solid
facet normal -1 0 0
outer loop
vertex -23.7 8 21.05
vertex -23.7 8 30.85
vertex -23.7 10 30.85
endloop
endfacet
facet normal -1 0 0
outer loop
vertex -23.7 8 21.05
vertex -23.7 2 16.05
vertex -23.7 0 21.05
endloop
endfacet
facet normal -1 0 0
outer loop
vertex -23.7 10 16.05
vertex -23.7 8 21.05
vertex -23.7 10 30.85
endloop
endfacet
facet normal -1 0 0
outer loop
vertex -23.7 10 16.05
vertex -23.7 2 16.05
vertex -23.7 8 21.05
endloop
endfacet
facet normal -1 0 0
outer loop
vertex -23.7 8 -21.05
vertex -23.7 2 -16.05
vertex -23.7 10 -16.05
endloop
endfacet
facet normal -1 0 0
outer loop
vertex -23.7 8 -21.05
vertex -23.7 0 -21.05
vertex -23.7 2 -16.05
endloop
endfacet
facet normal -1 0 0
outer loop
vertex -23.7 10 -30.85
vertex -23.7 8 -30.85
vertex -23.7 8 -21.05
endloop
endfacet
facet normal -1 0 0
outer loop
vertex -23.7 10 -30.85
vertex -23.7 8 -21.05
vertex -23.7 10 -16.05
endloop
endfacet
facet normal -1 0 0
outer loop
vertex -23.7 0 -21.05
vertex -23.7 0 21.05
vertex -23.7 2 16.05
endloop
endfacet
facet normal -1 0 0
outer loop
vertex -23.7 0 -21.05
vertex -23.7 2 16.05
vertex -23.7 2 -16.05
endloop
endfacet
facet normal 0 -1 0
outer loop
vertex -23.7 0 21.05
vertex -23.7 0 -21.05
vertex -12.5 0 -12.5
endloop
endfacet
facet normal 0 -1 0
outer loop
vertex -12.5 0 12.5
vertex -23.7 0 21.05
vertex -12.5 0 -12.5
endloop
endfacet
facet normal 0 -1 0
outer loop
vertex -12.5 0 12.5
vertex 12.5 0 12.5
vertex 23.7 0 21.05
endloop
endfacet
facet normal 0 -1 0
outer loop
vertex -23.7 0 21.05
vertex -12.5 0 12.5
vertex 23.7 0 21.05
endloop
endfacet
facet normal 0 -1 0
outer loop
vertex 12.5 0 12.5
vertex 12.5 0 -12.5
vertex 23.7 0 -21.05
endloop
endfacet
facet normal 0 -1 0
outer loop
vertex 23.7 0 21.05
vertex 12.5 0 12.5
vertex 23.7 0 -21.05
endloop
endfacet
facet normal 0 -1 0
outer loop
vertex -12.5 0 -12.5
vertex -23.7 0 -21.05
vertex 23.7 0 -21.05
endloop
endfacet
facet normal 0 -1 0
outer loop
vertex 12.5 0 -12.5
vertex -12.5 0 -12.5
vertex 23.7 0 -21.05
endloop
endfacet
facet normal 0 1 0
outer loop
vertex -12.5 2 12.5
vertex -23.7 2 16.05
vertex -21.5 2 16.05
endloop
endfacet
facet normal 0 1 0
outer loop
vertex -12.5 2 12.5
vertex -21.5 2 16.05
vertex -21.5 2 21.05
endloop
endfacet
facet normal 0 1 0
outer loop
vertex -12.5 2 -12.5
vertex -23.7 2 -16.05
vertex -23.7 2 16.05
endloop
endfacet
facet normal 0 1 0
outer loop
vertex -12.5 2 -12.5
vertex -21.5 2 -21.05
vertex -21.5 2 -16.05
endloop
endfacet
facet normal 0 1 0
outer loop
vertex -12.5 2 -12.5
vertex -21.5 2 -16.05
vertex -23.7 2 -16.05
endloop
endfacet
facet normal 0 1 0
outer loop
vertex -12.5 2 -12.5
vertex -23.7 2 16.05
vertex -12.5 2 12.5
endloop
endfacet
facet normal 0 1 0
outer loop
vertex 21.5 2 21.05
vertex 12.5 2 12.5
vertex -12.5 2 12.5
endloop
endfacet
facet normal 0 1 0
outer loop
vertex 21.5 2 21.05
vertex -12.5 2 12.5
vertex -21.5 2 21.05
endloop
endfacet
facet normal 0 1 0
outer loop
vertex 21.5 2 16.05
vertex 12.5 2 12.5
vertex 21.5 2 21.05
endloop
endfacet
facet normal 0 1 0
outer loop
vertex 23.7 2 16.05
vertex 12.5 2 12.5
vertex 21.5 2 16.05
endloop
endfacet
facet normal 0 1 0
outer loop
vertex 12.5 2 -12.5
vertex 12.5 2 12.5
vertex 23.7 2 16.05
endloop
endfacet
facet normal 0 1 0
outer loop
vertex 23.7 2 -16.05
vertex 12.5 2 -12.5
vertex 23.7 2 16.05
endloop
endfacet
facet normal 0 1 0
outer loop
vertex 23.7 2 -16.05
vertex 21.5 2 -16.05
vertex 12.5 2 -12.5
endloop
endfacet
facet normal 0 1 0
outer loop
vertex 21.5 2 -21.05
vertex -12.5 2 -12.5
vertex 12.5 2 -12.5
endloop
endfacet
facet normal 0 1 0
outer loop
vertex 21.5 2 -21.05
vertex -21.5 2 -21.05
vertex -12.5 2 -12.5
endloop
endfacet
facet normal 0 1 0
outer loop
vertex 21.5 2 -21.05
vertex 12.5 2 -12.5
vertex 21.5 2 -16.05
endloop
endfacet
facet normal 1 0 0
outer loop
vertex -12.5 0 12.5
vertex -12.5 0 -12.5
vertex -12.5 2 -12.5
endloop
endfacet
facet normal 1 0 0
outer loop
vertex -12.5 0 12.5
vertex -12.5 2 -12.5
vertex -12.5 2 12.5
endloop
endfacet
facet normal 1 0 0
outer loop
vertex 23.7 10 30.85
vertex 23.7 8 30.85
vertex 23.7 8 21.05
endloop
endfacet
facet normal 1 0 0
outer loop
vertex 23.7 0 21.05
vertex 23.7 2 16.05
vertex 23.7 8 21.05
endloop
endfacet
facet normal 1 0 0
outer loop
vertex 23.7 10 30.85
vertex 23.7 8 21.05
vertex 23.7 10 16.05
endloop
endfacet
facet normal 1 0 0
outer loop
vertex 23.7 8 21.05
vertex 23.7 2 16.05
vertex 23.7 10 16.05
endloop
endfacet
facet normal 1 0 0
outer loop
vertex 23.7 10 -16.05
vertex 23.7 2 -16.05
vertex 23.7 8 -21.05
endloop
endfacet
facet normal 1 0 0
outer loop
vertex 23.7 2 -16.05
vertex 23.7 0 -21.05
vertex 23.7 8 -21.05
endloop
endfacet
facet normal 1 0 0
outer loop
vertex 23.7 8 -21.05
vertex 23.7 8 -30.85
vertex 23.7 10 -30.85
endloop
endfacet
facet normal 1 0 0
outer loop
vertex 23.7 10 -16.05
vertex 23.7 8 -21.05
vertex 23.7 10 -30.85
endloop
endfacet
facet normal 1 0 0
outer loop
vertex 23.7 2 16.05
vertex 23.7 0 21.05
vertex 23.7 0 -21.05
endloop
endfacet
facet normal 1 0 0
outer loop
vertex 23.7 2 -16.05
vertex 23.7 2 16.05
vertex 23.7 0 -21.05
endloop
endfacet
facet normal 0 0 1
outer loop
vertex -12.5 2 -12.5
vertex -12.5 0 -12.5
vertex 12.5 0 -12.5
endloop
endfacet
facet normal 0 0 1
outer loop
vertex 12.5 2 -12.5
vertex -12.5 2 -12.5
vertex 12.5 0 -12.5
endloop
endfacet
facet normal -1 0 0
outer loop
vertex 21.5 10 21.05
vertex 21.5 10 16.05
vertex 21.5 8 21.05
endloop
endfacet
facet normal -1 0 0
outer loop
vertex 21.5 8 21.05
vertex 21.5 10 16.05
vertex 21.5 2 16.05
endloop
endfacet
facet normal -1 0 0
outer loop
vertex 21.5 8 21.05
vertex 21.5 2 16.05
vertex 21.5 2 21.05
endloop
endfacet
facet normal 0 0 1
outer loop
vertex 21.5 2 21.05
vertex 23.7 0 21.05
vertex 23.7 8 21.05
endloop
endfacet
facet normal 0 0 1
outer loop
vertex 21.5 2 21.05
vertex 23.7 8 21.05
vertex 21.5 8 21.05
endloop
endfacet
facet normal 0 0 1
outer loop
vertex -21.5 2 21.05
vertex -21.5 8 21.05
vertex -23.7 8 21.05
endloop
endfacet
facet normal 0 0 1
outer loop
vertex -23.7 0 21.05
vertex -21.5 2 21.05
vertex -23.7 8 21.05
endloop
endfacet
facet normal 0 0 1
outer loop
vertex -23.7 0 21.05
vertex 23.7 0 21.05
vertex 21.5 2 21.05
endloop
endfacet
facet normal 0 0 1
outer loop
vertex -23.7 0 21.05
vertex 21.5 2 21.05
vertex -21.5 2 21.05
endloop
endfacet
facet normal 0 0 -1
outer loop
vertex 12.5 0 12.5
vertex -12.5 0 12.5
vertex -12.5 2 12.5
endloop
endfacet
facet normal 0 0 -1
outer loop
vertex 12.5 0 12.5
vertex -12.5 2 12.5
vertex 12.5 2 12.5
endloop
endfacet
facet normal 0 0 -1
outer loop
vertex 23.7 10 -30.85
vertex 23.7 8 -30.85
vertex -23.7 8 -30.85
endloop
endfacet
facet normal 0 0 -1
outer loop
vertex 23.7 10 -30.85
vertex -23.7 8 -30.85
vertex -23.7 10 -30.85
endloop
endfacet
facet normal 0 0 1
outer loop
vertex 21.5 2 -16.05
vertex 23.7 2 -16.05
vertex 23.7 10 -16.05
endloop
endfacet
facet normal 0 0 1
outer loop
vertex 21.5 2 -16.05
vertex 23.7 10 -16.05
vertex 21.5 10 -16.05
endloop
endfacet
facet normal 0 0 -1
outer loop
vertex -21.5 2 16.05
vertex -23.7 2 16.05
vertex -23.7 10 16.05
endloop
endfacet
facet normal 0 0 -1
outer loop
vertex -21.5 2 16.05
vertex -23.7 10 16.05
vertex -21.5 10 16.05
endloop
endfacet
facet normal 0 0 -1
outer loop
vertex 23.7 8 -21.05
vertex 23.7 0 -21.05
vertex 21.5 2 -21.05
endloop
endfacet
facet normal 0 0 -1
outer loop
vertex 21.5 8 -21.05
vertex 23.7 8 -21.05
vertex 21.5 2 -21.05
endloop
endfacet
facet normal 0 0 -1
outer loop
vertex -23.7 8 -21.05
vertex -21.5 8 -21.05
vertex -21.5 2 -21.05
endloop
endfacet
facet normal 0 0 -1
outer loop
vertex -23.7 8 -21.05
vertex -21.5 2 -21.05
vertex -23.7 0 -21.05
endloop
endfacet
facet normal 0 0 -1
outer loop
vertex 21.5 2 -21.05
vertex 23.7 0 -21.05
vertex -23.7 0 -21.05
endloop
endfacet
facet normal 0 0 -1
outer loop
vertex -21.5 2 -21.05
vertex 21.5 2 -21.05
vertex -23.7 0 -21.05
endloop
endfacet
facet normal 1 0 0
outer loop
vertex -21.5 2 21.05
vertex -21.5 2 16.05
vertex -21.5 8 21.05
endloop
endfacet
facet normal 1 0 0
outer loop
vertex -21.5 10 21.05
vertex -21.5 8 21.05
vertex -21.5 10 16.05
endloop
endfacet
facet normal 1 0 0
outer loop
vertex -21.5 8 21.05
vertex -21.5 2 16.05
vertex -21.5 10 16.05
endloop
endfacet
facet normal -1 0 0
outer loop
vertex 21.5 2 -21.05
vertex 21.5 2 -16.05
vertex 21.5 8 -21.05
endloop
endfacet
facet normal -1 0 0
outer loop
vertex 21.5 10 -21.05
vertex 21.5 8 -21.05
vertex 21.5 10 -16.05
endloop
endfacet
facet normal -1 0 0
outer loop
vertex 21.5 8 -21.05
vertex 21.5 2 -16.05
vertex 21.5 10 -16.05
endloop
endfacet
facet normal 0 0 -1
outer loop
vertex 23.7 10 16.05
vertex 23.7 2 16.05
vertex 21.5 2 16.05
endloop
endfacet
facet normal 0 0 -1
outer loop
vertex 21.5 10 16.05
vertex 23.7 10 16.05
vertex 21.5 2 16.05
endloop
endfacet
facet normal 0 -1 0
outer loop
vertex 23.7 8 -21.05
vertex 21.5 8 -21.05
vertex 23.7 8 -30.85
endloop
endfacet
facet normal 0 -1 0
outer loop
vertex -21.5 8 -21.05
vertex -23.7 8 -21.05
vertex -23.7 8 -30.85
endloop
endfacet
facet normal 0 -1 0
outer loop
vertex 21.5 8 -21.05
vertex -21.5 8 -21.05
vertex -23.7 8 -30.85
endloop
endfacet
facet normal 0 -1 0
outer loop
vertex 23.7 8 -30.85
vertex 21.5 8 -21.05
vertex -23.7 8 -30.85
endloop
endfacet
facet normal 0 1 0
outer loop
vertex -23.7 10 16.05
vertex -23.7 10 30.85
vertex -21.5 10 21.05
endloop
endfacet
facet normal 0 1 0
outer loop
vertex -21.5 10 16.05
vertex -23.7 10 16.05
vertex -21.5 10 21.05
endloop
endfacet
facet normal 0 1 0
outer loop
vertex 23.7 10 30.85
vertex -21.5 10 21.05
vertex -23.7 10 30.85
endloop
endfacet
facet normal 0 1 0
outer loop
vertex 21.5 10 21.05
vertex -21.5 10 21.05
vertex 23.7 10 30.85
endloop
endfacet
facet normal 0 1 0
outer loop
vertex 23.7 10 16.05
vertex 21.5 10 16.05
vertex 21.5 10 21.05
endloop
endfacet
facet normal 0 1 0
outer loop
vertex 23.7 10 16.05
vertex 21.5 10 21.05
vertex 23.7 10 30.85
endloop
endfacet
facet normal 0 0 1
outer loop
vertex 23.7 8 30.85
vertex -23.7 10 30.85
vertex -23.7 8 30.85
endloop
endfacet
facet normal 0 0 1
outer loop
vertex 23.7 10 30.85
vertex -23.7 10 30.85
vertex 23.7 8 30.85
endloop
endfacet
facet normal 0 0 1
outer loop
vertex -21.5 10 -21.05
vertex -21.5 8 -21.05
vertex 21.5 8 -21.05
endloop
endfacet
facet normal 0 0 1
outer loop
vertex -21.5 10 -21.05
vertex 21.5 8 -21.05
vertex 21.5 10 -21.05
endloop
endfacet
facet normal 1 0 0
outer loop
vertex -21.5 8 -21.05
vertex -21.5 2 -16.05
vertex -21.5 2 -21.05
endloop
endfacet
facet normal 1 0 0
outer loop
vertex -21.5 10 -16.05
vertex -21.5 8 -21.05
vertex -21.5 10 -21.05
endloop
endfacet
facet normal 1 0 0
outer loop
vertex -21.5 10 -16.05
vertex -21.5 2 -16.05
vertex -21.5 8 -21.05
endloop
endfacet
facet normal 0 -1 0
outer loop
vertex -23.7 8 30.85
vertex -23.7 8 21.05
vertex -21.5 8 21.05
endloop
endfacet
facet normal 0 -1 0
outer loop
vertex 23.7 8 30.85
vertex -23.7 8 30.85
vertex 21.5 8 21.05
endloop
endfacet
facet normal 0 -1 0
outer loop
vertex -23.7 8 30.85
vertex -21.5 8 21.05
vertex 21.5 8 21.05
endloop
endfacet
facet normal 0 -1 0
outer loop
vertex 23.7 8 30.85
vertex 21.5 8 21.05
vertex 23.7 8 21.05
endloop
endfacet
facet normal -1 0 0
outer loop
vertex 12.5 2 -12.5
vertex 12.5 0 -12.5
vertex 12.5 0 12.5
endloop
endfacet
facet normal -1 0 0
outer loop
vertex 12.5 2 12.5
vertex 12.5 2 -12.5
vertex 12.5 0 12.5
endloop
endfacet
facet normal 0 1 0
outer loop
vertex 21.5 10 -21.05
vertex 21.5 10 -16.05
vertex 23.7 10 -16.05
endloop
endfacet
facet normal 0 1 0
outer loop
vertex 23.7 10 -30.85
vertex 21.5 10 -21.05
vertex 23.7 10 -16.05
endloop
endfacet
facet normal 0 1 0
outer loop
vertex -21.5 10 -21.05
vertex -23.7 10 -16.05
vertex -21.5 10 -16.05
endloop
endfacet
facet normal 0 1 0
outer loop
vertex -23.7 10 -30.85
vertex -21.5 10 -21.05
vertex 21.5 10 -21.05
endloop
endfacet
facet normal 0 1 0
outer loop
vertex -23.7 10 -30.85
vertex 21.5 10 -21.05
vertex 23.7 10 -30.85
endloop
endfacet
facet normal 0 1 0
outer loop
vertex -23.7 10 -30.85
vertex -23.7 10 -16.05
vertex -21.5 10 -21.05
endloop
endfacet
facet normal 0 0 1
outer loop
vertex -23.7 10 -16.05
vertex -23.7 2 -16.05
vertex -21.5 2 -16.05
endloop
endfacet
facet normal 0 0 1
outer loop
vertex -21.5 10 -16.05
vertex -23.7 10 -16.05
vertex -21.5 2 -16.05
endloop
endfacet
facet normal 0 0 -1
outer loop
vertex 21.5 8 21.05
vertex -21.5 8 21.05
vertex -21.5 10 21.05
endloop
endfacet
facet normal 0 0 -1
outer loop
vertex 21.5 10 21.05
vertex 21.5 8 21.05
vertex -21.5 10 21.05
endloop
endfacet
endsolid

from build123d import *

# Parameters (mm, degrees)
SKETCH3_W               = 47.4
SKETCH3_H               = 42.1
BOSS_EXTRUDE1_DEPTH     = 2
SKETCH4_W               = 2.2
SKETCH4_H               = 5
BOSS_EXTRUDE2_DEPTH     = 8
SKETCH6_W               = 2.2
SKETCH6_H               = 2
BOSS_EXTRUDE3_DEPTH     = 9.8
BOSS_EXTRUDE5_REACH     = 57.631
SKETCH10_W              = 9.8
SKETCH10_H              = 2
MIRROR3_COPY_1_SKETCH_W = 2.2
MIRROR3_COPY_1_SKETCH_H = 5
MIRROR3_COPY_1_DEPTH    = 8
MIRROR3_COPY_2_SKETCH_W = 2.2
MIRROR3_COPY_2_SKETCH_H = 2
MIRROR3_COPY_2_DEPTH    = 9.8
SKETCH7_W               = 25
SKETCH7_H               = 25
CUT_EXTRUDE1_DEPTH      = 2


with BuildPart() as part:
    # Sketch3 → Boss-Extrude1 (new body)
    with BuildSketch(Plane(origin=(0, 0, 0), x_dir=(1, 0, 0), z_dir=(0, 1, 0))):
        Rectangle(SKETCH3_W, SKETCH3_H)
    extrude(amount=BOSS_EXTRUDE1_DEPTH)

    # Sketch4 → Boss-Extrude2 (add)
    with BuildSketch(Plane(origin=(0, 2, 0), x_dir=(1, 0, 0), z_dir=(0, 1, 0))):
        with Locations((-22.6, 18.55)):
            Rectangle(SKETCH4_W, SKETCH4_H)
    boss_extrude2 = extrude(amount=BOSS_EXTRUDE2_DEPTH)

    # Sketch6 → Boss-Extrude3 (add)
    with BuildSketch(Plane(origin=(0, 0, -21.05), x_dir=(-1, 0, 0), z_dir=(0, 0, -1))):
        with Locations((22.6, 9)):
            Rectangle(SKETCH6_W, SKETCH6_H)
    boss_extrude3 = extrude(amount=BOSS_EXTRUDE3_DEPTH)

    # Mirror1: Boss-Extrude2, Boss-Extrude3 across plane
    add(boss_extrude2.mirror(Plane(origin=(0, 0, 0), x_dir=(0, 0, 1), z_dir=(1, 0, 0))))
    add(boss_extrude3.mirror(Plane(origin=(0, 0, 0), x_dir=(0, 0, 1), z_dir=(1, 0, 0))))

    # Sketch10 → Boss-Extrude5 (add, up to next)
    with BuildSketch(Plane(origin=(-21.5, 0, 0), x_dir=(0, 0, -1), z_dir=(1, 0, 0)), mode=Mode.PRIVATE) as boss_extrude5_sk1:
        with Locations((25.95, 9)):
            Rectangle(SKETCH10_W, SKETCH10_H)
    boss_extrude5_tool1 = extrude(boss_extrude5_sk1.sketch, amount=BOSS_EXTRUDE5_REACH, mode=Mode.PRIVATE) - part.part
    boss_extrude5 = boss_extrude5_tool1.solids().sort_by_distance((-21.5, 9, -25.95))[0]
    add(boss_extrude5)

    # Mirror3: Boss-Extrude2, Boss-Extrude3, Boss-Extrude5 across plane
    add(boss_extrude2.mirror(Plane.XY))
    add(boss_extrude3.mirror(Plane.XY))
    add(boss_extrude5.mirror(Plane.XY))

    # Mirror3 copy 1 sketch → Mirror3 copy 1 (add)
    with BuildSketch(Plane(origin=(0, 2, 0), x_dir=(-1, 0, 0), z_dir=(0, 1, 0))):
        with Locations((-22.6, 18.55)):
            Rectangle(MIRROR3_COPY_1_SKETCH_W, MIRROR3_COPY_1_SKETCH_H)
    extrude(amount=MIRROR3_COPY_1_DEPTH)

    # Mirror3 copy 2 sketch → Mirror3 copy 2 (add)
    with BuildSketch(Plane.XY.offset(21.05)):
        with Locations((22.6, 9)):
            Rectangle(MIRROR3_COPY_2_SKETCH_W, MIRROR3_COPY_2_SKETCH_H)
    extrude(amount=MIRROR3_COPY_2_DEPTH)

    # Sketch7 → Cut-Extrude1 (cut)
    with BuildSketch(Plane.XZ):
        Rectangle(SKETCH7_W, SKETCH7_H)
    extrude(amount=-CUT_EXTRUDE1_DEPTH, mode=Mode.SUBTRACT)


solid = part.part
